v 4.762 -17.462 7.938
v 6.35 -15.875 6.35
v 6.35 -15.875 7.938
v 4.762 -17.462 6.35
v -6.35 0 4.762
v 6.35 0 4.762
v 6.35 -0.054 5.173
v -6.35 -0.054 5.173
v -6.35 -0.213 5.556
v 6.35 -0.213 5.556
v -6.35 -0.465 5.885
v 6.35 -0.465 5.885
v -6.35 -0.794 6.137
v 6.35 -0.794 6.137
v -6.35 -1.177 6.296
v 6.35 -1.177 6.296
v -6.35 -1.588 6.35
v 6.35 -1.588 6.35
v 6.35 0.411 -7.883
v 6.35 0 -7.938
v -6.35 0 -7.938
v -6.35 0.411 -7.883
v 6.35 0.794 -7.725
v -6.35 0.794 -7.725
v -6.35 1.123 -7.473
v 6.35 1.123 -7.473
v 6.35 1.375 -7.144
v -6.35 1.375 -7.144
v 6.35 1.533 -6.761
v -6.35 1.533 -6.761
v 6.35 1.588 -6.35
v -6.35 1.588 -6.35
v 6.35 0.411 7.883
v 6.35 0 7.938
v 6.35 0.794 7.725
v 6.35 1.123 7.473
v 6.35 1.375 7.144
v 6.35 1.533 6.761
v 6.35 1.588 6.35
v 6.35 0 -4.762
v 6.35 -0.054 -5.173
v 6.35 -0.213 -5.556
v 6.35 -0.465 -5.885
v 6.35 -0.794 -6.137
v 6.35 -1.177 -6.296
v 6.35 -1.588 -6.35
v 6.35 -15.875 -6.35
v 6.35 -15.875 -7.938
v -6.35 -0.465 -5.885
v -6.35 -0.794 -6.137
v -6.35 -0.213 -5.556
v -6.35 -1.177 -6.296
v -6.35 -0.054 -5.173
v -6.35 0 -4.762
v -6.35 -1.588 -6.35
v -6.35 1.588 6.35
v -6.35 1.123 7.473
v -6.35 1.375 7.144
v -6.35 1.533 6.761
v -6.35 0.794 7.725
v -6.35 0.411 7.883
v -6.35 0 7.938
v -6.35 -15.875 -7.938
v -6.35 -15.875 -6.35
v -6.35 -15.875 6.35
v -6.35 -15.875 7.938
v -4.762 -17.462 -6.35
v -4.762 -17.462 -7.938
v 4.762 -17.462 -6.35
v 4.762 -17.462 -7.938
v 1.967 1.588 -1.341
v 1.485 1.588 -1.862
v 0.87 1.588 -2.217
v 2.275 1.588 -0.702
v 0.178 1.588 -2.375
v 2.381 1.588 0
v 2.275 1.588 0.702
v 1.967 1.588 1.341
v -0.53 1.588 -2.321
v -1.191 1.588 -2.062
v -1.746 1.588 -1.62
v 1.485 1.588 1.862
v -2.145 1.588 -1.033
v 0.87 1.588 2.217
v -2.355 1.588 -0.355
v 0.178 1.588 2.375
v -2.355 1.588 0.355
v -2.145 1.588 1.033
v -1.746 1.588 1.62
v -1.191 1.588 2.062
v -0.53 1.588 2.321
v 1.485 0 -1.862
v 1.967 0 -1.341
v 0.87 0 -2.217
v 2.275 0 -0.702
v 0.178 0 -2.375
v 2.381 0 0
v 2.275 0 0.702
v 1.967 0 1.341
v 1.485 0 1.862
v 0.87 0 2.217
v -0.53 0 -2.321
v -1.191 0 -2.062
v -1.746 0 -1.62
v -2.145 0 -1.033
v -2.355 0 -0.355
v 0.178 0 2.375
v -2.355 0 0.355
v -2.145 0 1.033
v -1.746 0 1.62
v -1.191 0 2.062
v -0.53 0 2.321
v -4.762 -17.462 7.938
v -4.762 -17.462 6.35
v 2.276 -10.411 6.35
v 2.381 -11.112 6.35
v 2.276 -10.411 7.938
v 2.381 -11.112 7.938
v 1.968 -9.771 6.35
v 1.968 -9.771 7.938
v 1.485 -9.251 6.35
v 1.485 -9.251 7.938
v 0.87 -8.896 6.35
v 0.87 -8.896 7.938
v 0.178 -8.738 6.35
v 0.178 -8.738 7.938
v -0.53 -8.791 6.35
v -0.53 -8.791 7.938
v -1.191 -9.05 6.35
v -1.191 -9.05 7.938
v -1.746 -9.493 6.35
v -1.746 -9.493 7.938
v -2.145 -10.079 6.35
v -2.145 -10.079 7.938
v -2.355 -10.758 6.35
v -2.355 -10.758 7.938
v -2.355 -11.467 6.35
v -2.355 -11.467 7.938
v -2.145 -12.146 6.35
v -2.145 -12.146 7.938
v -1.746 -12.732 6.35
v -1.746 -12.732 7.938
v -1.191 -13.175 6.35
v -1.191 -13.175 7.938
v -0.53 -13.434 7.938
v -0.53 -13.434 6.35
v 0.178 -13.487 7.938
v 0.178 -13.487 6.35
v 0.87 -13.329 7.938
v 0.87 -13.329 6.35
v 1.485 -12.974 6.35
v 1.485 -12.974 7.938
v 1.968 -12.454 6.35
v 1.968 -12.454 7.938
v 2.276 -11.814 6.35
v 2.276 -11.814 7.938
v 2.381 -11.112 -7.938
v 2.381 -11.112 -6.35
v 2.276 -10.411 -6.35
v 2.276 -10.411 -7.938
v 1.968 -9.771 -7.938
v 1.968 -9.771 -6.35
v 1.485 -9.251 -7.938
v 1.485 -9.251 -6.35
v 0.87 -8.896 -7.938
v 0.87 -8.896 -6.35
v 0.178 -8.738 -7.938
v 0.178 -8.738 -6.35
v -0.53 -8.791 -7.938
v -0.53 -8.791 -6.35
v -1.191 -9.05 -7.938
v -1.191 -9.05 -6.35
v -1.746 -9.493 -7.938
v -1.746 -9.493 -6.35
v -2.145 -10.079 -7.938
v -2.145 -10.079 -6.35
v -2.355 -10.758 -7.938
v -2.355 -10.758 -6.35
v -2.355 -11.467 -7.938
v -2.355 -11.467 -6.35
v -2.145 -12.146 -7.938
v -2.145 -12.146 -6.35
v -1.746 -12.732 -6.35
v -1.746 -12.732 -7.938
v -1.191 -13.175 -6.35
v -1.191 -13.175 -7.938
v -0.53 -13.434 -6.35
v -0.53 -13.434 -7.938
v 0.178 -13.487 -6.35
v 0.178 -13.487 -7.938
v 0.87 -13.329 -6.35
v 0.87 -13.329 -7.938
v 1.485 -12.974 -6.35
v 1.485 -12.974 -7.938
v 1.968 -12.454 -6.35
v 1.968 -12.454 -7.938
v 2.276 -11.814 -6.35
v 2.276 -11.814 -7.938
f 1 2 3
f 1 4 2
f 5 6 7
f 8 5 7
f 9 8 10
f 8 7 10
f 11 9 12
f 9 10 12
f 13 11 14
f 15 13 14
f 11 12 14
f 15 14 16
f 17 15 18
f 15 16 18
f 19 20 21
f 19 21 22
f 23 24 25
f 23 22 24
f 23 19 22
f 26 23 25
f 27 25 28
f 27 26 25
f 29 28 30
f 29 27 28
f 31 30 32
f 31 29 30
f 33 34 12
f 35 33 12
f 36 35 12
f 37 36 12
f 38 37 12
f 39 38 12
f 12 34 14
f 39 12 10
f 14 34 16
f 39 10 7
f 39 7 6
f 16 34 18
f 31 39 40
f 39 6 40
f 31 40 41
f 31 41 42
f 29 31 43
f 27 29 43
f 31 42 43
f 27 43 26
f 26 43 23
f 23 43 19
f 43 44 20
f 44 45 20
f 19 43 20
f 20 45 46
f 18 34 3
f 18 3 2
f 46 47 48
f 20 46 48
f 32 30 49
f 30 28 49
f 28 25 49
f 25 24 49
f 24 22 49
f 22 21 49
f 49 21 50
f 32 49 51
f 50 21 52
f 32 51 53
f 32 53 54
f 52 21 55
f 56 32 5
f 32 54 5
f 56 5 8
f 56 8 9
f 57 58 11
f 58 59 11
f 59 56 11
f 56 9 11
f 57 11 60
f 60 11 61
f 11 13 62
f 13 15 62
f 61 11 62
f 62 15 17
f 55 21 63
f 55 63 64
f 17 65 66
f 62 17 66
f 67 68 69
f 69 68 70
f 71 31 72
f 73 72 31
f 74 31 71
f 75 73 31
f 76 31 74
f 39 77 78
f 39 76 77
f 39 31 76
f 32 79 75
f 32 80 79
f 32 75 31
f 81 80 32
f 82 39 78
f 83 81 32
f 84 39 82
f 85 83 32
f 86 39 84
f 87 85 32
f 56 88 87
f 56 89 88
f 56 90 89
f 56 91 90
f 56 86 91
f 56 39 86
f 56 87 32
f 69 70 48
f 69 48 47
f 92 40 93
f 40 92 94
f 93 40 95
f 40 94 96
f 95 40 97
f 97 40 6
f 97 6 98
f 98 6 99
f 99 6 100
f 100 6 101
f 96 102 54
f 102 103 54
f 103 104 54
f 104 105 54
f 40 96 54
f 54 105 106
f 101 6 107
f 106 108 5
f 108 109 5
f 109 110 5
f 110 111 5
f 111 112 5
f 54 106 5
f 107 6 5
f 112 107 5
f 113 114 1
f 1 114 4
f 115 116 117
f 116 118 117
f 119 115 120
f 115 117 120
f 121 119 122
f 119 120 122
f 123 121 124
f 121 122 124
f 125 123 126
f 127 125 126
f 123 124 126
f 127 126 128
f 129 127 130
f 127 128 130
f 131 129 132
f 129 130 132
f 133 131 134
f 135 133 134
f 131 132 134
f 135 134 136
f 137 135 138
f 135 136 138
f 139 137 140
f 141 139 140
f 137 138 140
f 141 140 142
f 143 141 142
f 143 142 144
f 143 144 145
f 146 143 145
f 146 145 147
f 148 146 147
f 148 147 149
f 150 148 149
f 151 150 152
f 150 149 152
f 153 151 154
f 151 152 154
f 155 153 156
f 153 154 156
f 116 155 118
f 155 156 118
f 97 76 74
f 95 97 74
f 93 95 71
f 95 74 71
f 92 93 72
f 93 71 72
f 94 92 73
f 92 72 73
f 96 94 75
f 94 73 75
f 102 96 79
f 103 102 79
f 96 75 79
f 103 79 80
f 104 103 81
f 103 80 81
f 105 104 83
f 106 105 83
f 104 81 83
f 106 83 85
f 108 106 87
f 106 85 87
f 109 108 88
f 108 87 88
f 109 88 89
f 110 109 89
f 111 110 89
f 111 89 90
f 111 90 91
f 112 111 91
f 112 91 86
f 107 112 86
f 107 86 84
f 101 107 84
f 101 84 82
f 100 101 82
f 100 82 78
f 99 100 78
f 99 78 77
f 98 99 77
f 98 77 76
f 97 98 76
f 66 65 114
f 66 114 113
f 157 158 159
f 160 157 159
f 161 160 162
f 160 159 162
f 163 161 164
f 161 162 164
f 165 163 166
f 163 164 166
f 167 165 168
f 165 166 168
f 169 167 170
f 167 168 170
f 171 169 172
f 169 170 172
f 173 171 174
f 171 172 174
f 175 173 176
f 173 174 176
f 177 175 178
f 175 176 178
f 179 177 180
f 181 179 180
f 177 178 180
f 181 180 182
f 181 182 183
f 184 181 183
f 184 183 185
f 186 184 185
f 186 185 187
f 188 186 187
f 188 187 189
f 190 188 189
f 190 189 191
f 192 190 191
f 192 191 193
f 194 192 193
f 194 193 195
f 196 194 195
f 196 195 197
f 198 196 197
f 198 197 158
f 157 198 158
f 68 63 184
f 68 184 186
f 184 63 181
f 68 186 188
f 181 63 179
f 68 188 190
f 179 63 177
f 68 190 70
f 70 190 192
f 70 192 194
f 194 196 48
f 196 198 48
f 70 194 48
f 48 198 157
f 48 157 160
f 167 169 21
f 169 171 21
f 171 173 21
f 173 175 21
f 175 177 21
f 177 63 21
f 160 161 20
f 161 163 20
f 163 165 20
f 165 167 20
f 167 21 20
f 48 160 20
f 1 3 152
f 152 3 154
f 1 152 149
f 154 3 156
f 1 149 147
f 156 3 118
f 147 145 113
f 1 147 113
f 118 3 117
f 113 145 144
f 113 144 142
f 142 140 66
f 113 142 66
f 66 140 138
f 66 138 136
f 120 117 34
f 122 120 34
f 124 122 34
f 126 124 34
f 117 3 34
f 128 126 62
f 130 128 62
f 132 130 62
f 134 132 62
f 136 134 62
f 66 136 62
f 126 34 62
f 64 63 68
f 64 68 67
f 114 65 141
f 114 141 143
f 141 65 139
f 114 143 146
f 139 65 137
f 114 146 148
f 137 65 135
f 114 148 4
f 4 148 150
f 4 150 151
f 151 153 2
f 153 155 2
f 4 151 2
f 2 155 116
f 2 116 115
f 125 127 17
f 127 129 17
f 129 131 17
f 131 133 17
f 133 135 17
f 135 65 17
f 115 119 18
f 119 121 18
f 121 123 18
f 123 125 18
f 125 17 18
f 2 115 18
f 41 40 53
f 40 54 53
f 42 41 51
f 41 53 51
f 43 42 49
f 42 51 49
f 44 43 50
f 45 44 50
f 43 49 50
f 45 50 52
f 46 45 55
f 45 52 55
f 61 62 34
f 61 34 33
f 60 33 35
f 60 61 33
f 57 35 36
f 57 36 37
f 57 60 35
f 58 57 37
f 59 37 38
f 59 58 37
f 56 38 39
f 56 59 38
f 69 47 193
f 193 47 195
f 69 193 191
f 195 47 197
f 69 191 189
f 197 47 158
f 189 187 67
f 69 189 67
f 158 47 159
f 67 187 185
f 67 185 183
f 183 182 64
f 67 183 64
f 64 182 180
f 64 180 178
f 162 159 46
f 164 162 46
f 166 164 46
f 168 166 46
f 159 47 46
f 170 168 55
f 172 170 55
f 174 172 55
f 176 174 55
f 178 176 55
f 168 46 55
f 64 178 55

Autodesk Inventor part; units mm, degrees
ref_plane "YZ Plane" through (0, 0, 0) normal (1, 0, 0) x (0, 1, 0)
ref_plane "XZ Plane" through (0, 0, 0) normal (0, 1, 0) x (-1, 0, 0)
ref_plane "XY Plane" through (0, 0, 0) normal (0, 0, 1) x (1, 0, 0)
sketch "Sketch1" plane through (0, 0, 0) normal (0, 1, 0) x (-1, 0, 0)
  line L0 (-6.35, -6.35) -> (6.35, -6.35)
  line L1 (6.35, -6.35) -> (6.35, 6.35)
  line L2 (6.35, 6.35) -> (-6.35, 6.35)
  line L3 (-6.35, 6.35) -> (-6.35, -6.35)
  line L4 (-6.35, -6.35) -> (6.35, 6.35) construction
  line L5 (6.35, -6.35) -> (-6.35, 6.35) construction
  point P0 (0, 0)
  dimension "d0" = 12.7
  dimension "d1" = 12.7
extrude "Extrusion1" add sketch "Sketch1" along normal blind 1.5875
sketch "Sketch2" plane through (0, 1.5875, 0) normal (0, 1, 0) x (1, 0, 0)
  circle A0 centre (0, 0) radius 2.3812
  dimension "d4" = 4.7625
extrude "Extrusion2" cut sketch "Sketch2" against normal blind 1.5875
sketch "Sketch3" plane through (0, 1.5875, 0) normal (0, 1, 0) x (1, 0, 0)
  line L0 (-6.35, -6.35) -> (6.35, -6.35) projected
  line L1 (-6.35, -6.35) -> (6.35, -6.35)
  line L2 (6.35, -6.35) -> (6.35, -7.9375)
  line L3 (6.35, -7.9375) -> (-6.35, -7.9375)
  line L4 (-6.35, -7.9375) -> (-6.35, -6.35)
  line L5 (6.35, -6.35) -> (6.35, 6.35) projected
  line L6 (6.35, 6.35) -> (-6.35, 6.35)
  line L7 (-6.35, 6.35) -> (-6.35, 7.9375)
  line L8 (-6.35, 7.9375) -> (6.35, 7.9375)
  line L9 (6.35, 7.9375) -> (6.35, 6.35)
  point P0 (0, 0)
  dimension "d7" = 12.7
  dimension "d8" = 1.5875
  dimension "d9" = 12.7
  dimension "d10" = 1.5875
extrude "Extrusion3" add sketch "Sketch3" against normal blind 19.05
sketch "Sketch4" plane through (-6.35, 1.5875, 7.9375) normal (0, 0, 1) x (1, 0, 0)
  circle A0 centre (6.35, -12.7) radius 2.3813
  line L0 (12.7, 0) -> (12.7, -19.05) projected
  line L1 (12.7, -19.05) -> (0, -19.05) projected
  point P0 (6.35, -1.5875)
  dimension "d13" = 4.7625
  dimension "d14" = 6.35
  dimension "d15" = 6.35
extrude "Extrusion4" cut sketch "Sketch4" against normal blind 19.05
fillet "Fillet1" radius 1.5875 4 edges at (0, 1.5875, 7.9375) (0, 0, 6.35) (0, 0, -6.35) (0, 1.5875, -7.9375)
chamfer "Chamfer1" distance 1.5875 angle 45 4 edges at (6.35, -17.4625, 7.1437) (6.35, -17.4625, -7.1437) (-6.35, -17.4625, -7.1437) (-6.35, -17.4625, 7.1437)
properties part number "pnuematic bracket" material "Aluminum 6061"
